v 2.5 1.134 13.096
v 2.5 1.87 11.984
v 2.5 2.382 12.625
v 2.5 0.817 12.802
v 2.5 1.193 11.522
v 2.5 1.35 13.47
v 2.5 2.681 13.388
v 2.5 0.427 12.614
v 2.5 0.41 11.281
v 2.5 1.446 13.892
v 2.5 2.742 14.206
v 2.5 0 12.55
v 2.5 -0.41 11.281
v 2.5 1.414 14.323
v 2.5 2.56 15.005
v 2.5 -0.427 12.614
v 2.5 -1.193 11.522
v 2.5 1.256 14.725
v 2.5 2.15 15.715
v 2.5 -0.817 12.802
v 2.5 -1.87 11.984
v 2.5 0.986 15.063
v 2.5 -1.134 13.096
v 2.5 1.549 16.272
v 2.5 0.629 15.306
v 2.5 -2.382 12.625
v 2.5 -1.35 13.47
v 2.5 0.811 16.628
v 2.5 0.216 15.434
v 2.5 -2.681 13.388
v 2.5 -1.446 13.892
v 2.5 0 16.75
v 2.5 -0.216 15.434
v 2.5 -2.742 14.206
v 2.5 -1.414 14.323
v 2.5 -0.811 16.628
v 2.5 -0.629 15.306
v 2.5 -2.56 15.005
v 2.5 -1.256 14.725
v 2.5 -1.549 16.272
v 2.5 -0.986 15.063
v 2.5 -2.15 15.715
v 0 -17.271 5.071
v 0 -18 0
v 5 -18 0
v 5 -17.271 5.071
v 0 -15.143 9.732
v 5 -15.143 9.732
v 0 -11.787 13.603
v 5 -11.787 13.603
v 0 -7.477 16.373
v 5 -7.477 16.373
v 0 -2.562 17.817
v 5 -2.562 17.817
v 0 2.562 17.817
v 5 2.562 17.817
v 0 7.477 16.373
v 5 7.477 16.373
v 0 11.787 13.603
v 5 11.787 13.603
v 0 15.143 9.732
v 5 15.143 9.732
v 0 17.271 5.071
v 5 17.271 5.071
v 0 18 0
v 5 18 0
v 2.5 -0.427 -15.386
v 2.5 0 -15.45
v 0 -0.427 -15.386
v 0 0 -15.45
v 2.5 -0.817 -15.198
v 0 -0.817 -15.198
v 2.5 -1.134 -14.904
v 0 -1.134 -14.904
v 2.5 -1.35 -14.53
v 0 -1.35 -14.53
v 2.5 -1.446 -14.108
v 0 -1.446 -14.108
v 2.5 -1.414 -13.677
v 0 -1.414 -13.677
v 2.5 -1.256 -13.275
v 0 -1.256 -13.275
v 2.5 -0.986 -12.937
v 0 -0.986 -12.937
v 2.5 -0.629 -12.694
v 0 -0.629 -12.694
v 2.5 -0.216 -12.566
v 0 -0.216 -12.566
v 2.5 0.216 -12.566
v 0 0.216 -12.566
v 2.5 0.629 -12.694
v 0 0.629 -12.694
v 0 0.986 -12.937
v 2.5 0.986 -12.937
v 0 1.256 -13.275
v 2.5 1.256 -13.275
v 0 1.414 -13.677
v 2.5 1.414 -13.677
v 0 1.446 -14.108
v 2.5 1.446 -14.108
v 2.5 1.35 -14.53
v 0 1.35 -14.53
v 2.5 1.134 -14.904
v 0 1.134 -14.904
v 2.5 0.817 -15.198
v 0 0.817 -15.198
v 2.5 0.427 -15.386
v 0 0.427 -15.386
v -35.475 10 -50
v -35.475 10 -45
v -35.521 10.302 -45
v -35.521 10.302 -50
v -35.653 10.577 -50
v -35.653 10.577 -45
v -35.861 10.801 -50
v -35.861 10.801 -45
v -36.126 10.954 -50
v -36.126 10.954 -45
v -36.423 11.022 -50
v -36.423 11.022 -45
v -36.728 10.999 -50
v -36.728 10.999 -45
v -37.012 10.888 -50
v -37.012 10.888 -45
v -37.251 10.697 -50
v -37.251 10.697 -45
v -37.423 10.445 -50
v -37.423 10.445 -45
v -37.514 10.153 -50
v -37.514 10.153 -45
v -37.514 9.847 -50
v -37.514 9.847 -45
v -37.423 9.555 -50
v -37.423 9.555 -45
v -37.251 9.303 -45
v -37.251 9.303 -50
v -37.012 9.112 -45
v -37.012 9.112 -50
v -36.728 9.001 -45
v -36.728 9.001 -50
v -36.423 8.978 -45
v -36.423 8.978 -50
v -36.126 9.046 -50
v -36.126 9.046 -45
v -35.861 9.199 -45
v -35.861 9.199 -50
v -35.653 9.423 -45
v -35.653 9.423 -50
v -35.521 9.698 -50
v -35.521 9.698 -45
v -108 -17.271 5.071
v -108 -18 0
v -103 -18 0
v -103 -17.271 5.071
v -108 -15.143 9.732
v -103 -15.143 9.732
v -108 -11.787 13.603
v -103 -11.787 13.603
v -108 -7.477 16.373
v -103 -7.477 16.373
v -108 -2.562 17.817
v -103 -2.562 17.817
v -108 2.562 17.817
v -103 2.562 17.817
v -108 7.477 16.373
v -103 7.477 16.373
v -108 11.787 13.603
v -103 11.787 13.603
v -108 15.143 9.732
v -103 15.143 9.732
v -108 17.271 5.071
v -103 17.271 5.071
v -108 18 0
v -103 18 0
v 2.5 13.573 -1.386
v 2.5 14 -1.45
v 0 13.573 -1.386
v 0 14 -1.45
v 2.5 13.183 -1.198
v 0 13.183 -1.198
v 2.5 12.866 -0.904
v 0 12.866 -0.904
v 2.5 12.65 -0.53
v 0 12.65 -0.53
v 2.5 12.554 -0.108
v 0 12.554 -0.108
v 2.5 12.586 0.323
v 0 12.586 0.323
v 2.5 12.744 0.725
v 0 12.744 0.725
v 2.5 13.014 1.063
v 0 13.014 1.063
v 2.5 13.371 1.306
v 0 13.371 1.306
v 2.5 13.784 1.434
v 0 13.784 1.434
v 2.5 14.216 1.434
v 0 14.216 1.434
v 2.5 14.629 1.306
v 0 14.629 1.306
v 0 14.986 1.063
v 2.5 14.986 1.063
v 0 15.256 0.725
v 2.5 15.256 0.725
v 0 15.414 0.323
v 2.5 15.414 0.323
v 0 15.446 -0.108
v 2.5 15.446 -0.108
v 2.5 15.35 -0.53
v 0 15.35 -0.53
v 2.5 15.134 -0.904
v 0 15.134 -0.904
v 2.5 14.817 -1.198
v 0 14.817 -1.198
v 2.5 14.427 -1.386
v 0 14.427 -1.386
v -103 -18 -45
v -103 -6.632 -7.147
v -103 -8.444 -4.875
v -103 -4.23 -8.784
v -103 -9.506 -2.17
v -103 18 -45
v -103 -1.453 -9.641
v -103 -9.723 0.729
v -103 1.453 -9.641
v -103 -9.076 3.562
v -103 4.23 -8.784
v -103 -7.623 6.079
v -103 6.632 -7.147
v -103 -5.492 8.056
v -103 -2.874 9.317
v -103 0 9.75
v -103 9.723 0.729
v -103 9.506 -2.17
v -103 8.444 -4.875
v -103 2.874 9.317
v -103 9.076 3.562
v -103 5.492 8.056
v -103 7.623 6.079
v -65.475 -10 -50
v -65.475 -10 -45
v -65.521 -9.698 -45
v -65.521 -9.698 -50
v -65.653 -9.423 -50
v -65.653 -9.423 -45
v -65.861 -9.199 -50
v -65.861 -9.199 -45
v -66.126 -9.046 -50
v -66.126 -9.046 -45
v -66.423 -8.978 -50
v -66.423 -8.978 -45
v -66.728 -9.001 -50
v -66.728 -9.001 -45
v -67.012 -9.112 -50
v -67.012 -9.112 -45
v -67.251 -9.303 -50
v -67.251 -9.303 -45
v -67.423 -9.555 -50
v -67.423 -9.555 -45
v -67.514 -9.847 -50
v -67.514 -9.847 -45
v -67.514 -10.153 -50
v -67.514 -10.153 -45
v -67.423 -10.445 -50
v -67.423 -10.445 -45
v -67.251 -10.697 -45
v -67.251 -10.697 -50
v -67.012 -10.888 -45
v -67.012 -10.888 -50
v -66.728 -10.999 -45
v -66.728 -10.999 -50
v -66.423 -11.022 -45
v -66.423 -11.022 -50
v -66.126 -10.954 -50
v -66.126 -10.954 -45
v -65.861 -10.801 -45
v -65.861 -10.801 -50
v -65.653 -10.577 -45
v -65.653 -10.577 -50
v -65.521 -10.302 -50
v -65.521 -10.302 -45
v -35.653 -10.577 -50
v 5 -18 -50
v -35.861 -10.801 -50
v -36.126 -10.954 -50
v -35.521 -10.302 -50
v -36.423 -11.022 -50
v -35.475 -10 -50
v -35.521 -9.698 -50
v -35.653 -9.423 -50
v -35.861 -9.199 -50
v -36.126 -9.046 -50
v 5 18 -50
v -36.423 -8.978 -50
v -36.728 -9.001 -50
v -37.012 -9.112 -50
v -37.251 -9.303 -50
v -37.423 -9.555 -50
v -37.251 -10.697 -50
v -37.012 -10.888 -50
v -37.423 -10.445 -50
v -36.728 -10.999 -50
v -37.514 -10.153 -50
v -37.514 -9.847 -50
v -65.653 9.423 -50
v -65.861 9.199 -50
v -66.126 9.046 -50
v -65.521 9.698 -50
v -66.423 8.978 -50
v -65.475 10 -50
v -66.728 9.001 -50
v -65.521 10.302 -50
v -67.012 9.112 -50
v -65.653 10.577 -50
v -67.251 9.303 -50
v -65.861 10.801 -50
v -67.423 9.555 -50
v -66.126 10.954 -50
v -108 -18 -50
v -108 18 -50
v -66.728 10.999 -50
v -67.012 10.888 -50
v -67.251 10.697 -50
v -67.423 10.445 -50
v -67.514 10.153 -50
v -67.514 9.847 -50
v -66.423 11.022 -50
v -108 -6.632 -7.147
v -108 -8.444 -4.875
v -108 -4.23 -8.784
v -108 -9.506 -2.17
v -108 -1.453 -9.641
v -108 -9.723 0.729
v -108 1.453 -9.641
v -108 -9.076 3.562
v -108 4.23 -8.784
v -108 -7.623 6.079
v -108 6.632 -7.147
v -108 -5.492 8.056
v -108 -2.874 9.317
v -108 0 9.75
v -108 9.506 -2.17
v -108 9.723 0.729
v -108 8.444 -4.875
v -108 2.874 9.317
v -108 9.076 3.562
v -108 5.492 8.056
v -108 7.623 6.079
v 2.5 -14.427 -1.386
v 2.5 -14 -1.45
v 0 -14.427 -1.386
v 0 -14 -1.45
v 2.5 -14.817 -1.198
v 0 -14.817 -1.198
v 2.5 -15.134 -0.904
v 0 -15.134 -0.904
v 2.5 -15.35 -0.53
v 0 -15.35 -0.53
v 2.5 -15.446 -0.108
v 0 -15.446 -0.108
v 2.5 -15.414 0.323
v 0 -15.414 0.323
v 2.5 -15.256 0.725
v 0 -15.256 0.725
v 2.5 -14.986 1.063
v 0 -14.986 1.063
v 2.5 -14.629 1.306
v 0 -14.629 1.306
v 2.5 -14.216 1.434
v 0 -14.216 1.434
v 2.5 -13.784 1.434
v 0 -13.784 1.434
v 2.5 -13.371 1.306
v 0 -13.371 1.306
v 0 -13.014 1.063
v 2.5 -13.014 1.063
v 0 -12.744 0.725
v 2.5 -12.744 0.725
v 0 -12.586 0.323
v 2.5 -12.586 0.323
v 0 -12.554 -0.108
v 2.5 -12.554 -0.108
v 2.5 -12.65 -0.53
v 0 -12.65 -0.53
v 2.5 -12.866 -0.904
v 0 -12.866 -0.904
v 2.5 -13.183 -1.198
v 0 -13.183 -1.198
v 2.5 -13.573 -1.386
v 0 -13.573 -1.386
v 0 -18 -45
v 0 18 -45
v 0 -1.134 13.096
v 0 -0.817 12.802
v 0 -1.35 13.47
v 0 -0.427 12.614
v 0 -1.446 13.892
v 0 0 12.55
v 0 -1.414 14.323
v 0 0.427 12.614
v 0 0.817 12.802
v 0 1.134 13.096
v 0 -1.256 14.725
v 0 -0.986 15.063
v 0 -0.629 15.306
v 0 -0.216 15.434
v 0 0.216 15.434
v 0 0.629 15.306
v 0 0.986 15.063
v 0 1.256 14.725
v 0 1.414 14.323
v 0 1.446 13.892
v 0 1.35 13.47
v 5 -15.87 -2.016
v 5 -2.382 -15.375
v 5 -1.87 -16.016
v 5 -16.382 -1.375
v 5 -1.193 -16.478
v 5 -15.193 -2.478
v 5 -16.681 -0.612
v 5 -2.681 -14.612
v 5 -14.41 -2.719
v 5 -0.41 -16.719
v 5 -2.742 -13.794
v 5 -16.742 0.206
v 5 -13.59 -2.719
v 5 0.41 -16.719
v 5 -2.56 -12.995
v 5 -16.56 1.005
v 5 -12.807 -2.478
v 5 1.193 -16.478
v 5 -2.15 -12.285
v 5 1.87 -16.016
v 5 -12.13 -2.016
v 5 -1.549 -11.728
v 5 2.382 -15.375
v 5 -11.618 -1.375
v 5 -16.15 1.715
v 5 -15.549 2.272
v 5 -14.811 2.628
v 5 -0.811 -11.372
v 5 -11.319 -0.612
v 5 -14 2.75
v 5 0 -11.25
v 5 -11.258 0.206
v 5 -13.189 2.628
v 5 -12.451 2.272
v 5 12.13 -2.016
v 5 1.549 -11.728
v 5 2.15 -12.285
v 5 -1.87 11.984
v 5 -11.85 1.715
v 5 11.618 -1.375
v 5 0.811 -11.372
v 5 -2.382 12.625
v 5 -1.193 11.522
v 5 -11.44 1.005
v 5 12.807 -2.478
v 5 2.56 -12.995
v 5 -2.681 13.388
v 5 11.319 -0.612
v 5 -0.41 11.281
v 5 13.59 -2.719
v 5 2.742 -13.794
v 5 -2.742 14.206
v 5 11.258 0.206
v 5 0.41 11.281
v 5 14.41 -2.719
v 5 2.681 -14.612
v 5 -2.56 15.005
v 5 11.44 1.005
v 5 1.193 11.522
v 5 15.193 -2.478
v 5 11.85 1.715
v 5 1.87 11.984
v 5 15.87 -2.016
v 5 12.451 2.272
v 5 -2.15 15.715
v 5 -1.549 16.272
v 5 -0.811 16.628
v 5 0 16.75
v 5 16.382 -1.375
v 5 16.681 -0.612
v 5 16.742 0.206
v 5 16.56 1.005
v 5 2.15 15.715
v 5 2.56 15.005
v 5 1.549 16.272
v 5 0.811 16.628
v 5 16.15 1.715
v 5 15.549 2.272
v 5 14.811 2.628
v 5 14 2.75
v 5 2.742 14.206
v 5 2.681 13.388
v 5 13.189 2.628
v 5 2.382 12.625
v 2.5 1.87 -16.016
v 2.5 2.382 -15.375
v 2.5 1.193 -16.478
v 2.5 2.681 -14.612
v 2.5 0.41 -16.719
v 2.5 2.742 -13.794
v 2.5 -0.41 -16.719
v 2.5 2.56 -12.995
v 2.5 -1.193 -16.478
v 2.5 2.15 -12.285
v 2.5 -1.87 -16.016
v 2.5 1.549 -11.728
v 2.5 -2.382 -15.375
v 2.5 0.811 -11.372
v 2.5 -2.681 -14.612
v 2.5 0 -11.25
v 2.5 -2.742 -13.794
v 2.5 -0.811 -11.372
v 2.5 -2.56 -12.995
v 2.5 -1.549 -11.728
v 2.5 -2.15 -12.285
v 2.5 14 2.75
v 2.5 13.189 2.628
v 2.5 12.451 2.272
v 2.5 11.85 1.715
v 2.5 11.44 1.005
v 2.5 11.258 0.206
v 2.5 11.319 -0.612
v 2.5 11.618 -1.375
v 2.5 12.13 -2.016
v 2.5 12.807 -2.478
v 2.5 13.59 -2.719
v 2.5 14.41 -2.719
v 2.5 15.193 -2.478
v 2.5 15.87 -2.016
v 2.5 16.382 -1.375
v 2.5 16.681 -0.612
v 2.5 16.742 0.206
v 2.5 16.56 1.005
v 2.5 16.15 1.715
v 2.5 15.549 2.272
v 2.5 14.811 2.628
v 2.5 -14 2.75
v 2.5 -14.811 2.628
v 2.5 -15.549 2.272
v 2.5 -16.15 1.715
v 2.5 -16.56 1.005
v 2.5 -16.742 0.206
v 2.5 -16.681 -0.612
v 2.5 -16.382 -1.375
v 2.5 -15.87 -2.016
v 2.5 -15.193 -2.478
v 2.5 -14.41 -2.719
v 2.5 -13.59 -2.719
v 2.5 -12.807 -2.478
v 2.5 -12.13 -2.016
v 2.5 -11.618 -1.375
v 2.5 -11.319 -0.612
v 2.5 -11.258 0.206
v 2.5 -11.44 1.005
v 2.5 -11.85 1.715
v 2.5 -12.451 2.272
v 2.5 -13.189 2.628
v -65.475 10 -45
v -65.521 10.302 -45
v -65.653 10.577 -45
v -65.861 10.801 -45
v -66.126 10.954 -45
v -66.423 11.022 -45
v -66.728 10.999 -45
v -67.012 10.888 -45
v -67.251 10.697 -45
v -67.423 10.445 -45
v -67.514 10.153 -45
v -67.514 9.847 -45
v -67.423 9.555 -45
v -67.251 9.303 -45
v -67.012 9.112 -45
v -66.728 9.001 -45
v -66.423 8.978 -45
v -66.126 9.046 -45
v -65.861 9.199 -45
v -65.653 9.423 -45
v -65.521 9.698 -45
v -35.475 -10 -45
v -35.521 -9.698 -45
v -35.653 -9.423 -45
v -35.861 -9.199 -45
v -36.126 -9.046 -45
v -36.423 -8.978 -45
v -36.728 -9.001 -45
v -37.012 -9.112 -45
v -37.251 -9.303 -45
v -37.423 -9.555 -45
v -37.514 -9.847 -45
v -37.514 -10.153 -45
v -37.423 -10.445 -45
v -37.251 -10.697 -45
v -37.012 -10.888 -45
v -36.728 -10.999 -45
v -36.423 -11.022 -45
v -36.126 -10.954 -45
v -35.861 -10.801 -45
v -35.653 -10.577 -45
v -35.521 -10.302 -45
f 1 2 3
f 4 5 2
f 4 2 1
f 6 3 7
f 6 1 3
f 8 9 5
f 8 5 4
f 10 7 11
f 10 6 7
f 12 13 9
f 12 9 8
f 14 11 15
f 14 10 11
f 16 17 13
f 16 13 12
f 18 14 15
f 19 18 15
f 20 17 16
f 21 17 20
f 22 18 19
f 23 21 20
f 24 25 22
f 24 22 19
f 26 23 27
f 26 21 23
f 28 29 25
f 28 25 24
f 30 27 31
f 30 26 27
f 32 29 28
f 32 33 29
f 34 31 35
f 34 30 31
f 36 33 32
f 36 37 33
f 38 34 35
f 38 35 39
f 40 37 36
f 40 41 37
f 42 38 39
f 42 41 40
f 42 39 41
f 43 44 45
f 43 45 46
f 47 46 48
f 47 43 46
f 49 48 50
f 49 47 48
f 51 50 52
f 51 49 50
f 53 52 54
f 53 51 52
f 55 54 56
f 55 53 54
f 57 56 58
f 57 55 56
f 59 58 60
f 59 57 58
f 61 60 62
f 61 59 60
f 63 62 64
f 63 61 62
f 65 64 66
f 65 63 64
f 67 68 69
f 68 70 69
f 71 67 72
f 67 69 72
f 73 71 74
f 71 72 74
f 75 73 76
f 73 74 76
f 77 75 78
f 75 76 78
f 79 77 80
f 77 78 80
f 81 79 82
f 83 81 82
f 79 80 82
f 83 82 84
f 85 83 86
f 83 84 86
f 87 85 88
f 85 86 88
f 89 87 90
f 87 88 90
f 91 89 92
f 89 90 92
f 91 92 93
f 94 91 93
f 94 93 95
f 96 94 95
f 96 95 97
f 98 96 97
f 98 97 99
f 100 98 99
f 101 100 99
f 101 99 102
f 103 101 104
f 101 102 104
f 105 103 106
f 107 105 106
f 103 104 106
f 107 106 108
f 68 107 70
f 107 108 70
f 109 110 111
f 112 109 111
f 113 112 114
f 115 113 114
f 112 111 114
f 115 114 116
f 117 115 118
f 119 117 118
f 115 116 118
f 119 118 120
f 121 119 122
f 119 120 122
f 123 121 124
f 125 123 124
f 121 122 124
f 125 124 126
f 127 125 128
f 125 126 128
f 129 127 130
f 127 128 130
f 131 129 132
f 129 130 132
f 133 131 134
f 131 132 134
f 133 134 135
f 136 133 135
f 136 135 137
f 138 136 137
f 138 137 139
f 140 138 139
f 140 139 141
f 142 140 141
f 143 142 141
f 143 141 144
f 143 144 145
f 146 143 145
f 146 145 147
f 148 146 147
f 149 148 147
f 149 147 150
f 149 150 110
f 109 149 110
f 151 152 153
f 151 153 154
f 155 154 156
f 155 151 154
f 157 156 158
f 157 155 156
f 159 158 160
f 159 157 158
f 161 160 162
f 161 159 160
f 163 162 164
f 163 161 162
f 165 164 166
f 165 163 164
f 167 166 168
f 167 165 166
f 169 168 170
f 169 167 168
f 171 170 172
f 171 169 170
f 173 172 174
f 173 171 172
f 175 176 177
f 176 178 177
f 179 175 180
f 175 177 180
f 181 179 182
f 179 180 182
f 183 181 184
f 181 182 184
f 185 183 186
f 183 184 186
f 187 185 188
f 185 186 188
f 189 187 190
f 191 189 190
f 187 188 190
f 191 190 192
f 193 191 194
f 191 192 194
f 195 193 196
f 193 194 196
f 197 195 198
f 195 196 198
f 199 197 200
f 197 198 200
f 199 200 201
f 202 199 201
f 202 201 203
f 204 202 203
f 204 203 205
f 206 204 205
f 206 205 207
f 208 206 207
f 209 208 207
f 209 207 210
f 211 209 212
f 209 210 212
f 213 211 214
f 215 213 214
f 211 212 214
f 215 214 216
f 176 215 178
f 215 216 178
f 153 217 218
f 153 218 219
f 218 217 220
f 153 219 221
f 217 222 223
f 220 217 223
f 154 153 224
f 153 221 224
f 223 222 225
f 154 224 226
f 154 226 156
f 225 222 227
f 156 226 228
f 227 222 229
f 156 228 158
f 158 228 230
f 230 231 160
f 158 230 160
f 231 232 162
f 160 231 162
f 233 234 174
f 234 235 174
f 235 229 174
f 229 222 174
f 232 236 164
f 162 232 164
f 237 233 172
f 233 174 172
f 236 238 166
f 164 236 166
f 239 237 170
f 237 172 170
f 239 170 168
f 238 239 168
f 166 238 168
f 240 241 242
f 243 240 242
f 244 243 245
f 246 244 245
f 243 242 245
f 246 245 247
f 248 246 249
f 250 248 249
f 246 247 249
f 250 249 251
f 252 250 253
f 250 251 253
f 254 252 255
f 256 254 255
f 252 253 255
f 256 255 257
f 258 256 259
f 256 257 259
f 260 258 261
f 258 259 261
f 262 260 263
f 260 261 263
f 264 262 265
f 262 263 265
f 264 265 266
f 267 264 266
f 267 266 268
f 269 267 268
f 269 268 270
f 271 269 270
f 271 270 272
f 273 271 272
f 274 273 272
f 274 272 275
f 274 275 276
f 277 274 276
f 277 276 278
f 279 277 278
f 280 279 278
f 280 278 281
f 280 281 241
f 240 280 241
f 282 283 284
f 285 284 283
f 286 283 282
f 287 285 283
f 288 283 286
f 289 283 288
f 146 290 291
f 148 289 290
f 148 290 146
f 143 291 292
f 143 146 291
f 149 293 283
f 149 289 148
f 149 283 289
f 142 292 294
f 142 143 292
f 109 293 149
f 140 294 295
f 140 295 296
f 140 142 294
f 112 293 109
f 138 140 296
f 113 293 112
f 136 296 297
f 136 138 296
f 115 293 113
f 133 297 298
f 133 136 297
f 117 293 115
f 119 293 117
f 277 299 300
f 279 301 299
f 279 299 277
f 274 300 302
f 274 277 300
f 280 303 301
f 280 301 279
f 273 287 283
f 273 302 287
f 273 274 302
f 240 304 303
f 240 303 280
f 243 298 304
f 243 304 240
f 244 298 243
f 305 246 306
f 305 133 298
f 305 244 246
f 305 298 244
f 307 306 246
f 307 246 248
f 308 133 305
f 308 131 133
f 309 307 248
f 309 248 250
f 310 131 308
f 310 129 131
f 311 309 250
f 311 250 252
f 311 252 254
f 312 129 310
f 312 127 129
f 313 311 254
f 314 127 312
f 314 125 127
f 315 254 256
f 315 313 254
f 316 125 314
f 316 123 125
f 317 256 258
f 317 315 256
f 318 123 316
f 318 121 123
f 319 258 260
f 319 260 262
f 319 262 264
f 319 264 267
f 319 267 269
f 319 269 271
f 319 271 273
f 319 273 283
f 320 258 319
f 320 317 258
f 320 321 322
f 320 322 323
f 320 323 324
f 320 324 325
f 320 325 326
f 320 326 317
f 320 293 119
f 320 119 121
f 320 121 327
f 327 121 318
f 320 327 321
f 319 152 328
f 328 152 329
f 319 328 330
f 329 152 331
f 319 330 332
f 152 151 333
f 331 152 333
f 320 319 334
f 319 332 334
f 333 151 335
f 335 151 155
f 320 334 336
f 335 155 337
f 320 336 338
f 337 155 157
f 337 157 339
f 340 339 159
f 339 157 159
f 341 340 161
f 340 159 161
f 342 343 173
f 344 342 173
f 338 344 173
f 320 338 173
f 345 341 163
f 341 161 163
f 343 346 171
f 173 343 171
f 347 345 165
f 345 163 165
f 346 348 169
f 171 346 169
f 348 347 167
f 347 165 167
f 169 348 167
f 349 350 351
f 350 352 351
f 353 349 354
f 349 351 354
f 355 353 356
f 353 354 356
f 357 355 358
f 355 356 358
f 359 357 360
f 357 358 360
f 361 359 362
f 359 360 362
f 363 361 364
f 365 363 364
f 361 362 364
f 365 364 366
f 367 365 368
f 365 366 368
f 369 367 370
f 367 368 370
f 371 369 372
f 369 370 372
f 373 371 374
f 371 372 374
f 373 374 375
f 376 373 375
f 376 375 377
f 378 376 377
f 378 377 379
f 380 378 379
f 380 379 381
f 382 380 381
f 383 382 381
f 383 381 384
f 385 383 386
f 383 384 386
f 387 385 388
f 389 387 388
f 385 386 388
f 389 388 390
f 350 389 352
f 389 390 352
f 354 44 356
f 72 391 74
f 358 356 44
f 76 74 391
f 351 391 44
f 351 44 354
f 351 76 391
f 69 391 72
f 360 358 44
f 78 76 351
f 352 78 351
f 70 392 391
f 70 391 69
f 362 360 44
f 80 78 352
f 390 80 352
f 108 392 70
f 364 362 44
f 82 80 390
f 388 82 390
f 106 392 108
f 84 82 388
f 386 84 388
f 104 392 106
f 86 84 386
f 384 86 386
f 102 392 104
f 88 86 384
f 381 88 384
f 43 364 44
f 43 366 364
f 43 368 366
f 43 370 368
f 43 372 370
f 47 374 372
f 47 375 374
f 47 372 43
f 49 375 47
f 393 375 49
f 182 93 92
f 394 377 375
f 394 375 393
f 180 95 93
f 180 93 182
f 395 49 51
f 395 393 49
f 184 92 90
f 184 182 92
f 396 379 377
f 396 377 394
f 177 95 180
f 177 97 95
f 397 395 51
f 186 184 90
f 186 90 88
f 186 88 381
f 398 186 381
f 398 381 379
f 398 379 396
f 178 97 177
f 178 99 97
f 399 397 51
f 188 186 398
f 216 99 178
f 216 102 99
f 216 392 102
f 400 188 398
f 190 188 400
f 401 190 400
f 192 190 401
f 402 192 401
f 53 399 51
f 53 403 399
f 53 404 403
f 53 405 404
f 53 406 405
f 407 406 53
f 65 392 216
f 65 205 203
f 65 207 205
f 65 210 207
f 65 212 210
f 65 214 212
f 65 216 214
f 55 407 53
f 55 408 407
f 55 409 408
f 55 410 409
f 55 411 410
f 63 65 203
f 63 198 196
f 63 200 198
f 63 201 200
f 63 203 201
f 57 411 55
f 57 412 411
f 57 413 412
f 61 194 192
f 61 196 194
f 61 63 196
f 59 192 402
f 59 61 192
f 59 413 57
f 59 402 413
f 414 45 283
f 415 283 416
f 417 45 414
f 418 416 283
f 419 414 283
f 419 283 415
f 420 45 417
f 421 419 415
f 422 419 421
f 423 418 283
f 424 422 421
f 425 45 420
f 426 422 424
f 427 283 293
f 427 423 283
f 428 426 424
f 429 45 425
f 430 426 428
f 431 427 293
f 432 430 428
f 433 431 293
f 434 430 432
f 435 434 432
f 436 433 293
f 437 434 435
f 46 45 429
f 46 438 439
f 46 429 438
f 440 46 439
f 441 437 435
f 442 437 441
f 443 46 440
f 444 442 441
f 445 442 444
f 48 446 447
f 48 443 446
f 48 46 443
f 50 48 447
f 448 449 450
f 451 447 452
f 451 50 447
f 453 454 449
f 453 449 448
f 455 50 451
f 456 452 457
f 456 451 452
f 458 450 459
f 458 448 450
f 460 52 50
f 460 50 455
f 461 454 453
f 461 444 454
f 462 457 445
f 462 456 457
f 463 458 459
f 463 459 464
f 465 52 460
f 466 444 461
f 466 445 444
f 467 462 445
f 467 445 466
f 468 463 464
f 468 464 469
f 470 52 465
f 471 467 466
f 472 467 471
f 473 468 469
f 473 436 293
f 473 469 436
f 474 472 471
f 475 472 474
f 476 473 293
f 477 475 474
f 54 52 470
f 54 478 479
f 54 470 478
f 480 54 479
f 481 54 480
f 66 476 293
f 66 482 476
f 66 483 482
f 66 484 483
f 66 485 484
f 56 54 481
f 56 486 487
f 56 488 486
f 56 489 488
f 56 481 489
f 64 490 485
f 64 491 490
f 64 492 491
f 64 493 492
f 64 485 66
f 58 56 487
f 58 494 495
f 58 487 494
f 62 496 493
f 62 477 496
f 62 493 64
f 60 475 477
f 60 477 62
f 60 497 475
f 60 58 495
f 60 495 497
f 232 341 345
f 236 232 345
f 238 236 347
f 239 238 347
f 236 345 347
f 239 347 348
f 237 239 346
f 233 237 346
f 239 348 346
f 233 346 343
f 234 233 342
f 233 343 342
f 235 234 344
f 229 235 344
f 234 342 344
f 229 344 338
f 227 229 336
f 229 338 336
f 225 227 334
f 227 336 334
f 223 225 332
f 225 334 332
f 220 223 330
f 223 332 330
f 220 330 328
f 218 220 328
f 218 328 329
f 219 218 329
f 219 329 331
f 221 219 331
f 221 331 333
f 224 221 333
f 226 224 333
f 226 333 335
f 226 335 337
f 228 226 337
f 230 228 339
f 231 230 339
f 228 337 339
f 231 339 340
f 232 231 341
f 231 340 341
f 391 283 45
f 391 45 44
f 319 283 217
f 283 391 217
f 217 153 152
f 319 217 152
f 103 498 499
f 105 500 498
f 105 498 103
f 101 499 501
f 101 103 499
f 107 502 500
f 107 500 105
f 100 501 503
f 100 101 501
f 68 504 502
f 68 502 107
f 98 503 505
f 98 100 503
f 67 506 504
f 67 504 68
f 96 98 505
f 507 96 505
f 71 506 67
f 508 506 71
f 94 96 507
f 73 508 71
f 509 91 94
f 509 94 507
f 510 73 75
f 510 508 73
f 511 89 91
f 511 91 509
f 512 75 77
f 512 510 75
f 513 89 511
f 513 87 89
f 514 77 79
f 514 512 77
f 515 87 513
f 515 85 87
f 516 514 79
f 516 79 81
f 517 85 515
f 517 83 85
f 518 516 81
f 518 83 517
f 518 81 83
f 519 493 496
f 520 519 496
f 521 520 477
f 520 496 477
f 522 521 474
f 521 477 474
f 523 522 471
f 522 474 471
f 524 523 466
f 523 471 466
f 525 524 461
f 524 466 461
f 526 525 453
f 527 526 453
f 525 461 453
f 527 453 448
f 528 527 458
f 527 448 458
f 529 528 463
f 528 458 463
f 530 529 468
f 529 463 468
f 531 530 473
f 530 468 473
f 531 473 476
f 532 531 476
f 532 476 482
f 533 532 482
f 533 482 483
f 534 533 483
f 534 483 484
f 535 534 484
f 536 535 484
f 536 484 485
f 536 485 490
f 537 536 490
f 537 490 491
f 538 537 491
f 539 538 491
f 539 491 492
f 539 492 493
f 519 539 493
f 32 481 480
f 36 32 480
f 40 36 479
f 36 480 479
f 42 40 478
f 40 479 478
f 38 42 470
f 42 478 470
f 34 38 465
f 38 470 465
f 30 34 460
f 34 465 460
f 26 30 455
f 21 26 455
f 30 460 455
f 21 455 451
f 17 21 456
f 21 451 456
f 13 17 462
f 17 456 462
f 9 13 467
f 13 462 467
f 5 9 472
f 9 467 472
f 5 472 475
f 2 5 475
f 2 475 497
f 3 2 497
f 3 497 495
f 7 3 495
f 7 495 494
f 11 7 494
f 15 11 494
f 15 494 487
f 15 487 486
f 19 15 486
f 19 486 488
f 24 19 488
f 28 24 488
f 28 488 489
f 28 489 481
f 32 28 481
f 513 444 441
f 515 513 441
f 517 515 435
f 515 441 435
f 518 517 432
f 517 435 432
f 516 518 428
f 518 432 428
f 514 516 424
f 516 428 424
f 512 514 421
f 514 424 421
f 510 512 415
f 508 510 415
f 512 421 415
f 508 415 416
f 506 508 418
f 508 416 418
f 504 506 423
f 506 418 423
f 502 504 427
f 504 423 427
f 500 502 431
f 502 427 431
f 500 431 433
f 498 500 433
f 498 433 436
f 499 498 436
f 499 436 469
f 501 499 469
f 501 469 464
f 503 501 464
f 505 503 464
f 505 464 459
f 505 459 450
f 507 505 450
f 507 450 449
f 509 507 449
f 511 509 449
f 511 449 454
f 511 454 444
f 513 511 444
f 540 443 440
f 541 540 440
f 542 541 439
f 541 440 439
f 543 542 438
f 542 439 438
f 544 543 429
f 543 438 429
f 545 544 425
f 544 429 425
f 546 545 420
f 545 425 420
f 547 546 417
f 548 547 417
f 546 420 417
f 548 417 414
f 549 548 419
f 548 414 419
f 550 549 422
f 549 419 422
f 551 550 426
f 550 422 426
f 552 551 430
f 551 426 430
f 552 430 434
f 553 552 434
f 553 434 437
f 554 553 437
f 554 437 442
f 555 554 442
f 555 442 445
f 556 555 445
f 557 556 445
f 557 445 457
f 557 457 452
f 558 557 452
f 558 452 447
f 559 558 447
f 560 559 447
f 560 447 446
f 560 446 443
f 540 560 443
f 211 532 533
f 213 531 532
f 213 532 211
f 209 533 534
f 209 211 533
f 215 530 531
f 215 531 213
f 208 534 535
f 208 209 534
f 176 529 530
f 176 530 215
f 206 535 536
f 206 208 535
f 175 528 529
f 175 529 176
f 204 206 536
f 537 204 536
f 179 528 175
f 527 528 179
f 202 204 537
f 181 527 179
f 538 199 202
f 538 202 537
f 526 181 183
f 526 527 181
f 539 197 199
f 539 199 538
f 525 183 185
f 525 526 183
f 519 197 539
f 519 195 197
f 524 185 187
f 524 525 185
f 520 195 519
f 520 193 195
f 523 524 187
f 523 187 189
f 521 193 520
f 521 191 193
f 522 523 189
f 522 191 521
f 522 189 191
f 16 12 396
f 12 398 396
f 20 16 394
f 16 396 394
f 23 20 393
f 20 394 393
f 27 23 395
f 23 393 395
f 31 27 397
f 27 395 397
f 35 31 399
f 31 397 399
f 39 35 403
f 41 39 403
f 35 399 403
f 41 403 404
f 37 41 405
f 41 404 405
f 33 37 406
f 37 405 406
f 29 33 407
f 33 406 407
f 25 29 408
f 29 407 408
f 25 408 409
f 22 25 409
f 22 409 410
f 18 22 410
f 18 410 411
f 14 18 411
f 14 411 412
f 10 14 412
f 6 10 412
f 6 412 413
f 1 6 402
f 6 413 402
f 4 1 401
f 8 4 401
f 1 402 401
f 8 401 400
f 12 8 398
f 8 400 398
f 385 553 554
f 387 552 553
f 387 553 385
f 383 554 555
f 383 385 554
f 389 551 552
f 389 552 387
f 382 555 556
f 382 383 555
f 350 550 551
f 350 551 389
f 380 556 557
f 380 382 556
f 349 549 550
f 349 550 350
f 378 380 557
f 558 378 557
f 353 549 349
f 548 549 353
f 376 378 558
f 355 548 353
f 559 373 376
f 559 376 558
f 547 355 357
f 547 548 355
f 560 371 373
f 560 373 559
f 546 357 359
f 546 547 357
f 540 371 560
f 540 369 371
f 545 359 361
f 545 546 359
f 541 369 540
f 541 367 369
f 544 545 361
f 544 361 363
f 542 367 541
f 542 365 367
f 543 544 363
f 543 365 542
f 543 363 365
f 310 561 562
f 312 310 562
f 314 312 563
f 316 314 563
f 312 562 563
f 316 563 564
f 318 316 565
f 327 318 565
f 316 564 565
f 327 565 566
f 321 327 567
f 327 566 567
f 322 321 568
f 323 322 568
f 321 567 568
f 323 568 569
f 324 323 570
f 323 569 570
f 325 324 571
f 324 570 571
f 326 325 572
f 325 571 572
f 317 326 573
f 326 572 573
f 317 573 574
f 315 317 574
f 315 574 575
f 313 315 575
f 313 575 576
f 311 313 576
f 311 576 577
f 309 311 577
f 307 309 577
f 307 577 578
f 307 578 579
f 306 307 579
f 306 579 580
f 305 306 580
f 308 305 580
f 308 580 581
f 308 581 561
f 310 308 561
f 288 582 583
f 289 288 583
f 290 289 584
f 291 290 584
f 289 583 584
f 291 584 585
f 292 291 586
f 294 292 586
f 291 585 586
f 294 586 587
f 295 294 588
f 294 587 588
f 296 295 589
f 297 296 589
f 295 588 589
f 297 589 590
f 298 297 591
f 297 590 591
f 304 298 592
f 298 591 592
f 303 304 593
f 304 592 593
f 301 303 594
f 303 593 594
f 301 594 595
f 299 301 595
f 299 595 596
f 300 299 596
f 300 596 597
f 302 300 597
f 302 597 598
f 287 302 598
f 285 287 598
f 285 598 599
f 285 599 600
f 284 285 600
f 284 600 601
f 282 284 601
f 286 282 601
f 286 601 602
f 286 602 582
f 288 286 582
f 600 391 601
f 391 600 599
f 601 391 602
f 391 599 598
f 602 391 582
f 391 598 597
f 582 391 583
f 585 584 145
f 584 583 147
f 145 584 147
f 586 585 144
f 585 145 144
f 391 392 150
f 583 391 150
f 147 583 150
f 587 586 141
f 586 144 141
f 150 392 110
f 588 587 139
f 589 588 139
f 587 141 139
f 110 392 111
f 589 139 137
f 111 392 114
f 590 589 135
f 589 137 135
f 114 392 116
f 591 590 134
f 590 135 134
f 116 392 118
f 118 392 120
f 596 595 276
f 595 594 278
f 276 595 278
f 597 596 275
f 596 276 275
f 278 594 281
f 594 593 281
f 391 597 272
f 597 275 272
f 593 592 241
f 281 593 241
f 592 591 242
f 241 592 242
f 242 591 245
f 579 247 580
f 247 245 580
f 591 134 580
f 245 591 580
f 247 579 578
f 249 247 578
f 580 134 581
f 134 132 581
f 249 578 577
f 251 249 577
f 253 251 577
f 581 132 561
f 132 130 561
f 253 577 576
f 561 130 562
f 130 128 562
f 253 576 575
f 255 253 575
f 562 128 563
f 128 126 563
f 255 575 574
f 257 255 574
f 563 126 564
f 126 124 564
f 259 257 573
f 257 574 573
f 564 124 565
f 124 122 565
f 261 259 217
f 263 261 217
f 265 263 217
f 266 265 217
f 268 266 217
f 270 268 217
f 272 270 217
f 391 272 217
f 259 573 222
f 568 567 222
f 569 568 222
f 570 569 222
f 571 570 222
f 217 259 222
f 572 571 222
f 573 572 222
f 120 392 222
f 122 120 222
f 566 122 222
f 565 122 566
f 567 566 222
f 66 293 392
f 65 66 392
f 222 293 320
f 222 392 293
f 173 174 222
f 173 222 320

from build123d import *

# Parameters (mm, degrees)
BOSS_EXTRUDE1_DEPTH                               = 5
CBORE_FOR_M2_5_SOCKET_HEAD_CAP_SCREW1_D           = 2.9
CBORE_FOR_M2_5_SOCKET_HEAD_CAP_SCREW1_CBORE_D     = 5.5
CBORE_FOR_M2_5_SOCKET_HEAD_CAP_SCREW1_CBORE_DEPTH = 2.5
SKETCH6_W                                         = 113
SKETCH6_H                                         = 36
BOSS_EXTRUDE2_DEPTH                               = 5
BOSS_EXTRUDE3_DEPTH                               = 5
SKETCH8_R                                         = 9.75
CUT_EXTRUDE1_DEPTH                                = 5
M2_5_TAPPED_HOLE1_D                               = 2.05


with BuildPart() as part:
    # Sketch1 → Boss-Extrude1 (new body)
    with BuildSketch(Plane(origin=(0, 0, 0), x_dir=(0, 0, -1), z_dir=(1, 0, 0))):
        with BuildLine():
            Line((0, 18), (45, 18))
            Line((45, 18), (45, -18))
            Line((45, -18), (0, -18))
            ThreePointArc((0, -18), (-18, 0), (0, 18))
        make_face()
    extrude(amount=BOSS_EXTRUDE1_DEPTH)

    # CBORE for M2.5 Socket Head Cap Screw1 (through all)
    with Locations(Plane(origin=(5, 14, 0), x_dir=(0, 0, 1), z_dir=(1, 0, 0))):
        with Locations((0, 0), (-14, 14), (0, 28), (14, 14)):
            CounterBoreHole(CBORE_FOR_M2_5_SOCKET_HEAD_CAP_SCREW1_D / 2, CBORE_FOR_M2_5_SOCKET_HEAD_CAP_SCREW1_CBORE_D / 2, CBORE_FOR_M2_5_SOCKET_HEAD_CAP_SCREW1_CBORE_DEPTH)

    # Sketch6 → Boss-Extrude2 (add)
    with BuildSketch(Plane(origin=(0, 0, -45), x_dir=(-1, 0, 0), z_dir=(0, 0, -1))):
        with Locations((51.5, 0)):
            Rectangle(SKETCH6_W, SKETCH6_H)
    extrude(amount=BOSS_EXTRUDE2_DEPTH)

    # Sketch7 → Boss-Extrude3 (add)
    with BuildSketch(Plane.ZY.offset(108)):
        with BuildLine():
            Line((-50, -18), (0, -18))
            ThreePointArc((0, -18), (18, 0), (0, 18))
            Line((0, 18), (-50, 18))
            Line((-50, 18), (-50, -18))
        make_face()
    extrude(amount=-BOSS_EXTRUDE3_DEPTH)

    # Sketch8 → Cut-Extrude1 (cut)
    with BuildSketch(Plane.ZY.offset(108)):
        Circle(SKETCH8_R)
    extrude(amount=-CUT_EXTRUDE1_DEPTH, mode=Mode.SUBTRACT)

    # M2.5 Tapped Hole1 (through all)
    with Locations(Plane(origin=(0, 0, -50), x_dir=(-1, 0, 0), z_dir=(0, 0, -1))):
        with Locations((36.5, 10), (66.5, 10), (66.5, -10), (36.5, -10)):
            Hole(M2_5_TAPPED_HOLE1_D / 2)


solid = part.part
